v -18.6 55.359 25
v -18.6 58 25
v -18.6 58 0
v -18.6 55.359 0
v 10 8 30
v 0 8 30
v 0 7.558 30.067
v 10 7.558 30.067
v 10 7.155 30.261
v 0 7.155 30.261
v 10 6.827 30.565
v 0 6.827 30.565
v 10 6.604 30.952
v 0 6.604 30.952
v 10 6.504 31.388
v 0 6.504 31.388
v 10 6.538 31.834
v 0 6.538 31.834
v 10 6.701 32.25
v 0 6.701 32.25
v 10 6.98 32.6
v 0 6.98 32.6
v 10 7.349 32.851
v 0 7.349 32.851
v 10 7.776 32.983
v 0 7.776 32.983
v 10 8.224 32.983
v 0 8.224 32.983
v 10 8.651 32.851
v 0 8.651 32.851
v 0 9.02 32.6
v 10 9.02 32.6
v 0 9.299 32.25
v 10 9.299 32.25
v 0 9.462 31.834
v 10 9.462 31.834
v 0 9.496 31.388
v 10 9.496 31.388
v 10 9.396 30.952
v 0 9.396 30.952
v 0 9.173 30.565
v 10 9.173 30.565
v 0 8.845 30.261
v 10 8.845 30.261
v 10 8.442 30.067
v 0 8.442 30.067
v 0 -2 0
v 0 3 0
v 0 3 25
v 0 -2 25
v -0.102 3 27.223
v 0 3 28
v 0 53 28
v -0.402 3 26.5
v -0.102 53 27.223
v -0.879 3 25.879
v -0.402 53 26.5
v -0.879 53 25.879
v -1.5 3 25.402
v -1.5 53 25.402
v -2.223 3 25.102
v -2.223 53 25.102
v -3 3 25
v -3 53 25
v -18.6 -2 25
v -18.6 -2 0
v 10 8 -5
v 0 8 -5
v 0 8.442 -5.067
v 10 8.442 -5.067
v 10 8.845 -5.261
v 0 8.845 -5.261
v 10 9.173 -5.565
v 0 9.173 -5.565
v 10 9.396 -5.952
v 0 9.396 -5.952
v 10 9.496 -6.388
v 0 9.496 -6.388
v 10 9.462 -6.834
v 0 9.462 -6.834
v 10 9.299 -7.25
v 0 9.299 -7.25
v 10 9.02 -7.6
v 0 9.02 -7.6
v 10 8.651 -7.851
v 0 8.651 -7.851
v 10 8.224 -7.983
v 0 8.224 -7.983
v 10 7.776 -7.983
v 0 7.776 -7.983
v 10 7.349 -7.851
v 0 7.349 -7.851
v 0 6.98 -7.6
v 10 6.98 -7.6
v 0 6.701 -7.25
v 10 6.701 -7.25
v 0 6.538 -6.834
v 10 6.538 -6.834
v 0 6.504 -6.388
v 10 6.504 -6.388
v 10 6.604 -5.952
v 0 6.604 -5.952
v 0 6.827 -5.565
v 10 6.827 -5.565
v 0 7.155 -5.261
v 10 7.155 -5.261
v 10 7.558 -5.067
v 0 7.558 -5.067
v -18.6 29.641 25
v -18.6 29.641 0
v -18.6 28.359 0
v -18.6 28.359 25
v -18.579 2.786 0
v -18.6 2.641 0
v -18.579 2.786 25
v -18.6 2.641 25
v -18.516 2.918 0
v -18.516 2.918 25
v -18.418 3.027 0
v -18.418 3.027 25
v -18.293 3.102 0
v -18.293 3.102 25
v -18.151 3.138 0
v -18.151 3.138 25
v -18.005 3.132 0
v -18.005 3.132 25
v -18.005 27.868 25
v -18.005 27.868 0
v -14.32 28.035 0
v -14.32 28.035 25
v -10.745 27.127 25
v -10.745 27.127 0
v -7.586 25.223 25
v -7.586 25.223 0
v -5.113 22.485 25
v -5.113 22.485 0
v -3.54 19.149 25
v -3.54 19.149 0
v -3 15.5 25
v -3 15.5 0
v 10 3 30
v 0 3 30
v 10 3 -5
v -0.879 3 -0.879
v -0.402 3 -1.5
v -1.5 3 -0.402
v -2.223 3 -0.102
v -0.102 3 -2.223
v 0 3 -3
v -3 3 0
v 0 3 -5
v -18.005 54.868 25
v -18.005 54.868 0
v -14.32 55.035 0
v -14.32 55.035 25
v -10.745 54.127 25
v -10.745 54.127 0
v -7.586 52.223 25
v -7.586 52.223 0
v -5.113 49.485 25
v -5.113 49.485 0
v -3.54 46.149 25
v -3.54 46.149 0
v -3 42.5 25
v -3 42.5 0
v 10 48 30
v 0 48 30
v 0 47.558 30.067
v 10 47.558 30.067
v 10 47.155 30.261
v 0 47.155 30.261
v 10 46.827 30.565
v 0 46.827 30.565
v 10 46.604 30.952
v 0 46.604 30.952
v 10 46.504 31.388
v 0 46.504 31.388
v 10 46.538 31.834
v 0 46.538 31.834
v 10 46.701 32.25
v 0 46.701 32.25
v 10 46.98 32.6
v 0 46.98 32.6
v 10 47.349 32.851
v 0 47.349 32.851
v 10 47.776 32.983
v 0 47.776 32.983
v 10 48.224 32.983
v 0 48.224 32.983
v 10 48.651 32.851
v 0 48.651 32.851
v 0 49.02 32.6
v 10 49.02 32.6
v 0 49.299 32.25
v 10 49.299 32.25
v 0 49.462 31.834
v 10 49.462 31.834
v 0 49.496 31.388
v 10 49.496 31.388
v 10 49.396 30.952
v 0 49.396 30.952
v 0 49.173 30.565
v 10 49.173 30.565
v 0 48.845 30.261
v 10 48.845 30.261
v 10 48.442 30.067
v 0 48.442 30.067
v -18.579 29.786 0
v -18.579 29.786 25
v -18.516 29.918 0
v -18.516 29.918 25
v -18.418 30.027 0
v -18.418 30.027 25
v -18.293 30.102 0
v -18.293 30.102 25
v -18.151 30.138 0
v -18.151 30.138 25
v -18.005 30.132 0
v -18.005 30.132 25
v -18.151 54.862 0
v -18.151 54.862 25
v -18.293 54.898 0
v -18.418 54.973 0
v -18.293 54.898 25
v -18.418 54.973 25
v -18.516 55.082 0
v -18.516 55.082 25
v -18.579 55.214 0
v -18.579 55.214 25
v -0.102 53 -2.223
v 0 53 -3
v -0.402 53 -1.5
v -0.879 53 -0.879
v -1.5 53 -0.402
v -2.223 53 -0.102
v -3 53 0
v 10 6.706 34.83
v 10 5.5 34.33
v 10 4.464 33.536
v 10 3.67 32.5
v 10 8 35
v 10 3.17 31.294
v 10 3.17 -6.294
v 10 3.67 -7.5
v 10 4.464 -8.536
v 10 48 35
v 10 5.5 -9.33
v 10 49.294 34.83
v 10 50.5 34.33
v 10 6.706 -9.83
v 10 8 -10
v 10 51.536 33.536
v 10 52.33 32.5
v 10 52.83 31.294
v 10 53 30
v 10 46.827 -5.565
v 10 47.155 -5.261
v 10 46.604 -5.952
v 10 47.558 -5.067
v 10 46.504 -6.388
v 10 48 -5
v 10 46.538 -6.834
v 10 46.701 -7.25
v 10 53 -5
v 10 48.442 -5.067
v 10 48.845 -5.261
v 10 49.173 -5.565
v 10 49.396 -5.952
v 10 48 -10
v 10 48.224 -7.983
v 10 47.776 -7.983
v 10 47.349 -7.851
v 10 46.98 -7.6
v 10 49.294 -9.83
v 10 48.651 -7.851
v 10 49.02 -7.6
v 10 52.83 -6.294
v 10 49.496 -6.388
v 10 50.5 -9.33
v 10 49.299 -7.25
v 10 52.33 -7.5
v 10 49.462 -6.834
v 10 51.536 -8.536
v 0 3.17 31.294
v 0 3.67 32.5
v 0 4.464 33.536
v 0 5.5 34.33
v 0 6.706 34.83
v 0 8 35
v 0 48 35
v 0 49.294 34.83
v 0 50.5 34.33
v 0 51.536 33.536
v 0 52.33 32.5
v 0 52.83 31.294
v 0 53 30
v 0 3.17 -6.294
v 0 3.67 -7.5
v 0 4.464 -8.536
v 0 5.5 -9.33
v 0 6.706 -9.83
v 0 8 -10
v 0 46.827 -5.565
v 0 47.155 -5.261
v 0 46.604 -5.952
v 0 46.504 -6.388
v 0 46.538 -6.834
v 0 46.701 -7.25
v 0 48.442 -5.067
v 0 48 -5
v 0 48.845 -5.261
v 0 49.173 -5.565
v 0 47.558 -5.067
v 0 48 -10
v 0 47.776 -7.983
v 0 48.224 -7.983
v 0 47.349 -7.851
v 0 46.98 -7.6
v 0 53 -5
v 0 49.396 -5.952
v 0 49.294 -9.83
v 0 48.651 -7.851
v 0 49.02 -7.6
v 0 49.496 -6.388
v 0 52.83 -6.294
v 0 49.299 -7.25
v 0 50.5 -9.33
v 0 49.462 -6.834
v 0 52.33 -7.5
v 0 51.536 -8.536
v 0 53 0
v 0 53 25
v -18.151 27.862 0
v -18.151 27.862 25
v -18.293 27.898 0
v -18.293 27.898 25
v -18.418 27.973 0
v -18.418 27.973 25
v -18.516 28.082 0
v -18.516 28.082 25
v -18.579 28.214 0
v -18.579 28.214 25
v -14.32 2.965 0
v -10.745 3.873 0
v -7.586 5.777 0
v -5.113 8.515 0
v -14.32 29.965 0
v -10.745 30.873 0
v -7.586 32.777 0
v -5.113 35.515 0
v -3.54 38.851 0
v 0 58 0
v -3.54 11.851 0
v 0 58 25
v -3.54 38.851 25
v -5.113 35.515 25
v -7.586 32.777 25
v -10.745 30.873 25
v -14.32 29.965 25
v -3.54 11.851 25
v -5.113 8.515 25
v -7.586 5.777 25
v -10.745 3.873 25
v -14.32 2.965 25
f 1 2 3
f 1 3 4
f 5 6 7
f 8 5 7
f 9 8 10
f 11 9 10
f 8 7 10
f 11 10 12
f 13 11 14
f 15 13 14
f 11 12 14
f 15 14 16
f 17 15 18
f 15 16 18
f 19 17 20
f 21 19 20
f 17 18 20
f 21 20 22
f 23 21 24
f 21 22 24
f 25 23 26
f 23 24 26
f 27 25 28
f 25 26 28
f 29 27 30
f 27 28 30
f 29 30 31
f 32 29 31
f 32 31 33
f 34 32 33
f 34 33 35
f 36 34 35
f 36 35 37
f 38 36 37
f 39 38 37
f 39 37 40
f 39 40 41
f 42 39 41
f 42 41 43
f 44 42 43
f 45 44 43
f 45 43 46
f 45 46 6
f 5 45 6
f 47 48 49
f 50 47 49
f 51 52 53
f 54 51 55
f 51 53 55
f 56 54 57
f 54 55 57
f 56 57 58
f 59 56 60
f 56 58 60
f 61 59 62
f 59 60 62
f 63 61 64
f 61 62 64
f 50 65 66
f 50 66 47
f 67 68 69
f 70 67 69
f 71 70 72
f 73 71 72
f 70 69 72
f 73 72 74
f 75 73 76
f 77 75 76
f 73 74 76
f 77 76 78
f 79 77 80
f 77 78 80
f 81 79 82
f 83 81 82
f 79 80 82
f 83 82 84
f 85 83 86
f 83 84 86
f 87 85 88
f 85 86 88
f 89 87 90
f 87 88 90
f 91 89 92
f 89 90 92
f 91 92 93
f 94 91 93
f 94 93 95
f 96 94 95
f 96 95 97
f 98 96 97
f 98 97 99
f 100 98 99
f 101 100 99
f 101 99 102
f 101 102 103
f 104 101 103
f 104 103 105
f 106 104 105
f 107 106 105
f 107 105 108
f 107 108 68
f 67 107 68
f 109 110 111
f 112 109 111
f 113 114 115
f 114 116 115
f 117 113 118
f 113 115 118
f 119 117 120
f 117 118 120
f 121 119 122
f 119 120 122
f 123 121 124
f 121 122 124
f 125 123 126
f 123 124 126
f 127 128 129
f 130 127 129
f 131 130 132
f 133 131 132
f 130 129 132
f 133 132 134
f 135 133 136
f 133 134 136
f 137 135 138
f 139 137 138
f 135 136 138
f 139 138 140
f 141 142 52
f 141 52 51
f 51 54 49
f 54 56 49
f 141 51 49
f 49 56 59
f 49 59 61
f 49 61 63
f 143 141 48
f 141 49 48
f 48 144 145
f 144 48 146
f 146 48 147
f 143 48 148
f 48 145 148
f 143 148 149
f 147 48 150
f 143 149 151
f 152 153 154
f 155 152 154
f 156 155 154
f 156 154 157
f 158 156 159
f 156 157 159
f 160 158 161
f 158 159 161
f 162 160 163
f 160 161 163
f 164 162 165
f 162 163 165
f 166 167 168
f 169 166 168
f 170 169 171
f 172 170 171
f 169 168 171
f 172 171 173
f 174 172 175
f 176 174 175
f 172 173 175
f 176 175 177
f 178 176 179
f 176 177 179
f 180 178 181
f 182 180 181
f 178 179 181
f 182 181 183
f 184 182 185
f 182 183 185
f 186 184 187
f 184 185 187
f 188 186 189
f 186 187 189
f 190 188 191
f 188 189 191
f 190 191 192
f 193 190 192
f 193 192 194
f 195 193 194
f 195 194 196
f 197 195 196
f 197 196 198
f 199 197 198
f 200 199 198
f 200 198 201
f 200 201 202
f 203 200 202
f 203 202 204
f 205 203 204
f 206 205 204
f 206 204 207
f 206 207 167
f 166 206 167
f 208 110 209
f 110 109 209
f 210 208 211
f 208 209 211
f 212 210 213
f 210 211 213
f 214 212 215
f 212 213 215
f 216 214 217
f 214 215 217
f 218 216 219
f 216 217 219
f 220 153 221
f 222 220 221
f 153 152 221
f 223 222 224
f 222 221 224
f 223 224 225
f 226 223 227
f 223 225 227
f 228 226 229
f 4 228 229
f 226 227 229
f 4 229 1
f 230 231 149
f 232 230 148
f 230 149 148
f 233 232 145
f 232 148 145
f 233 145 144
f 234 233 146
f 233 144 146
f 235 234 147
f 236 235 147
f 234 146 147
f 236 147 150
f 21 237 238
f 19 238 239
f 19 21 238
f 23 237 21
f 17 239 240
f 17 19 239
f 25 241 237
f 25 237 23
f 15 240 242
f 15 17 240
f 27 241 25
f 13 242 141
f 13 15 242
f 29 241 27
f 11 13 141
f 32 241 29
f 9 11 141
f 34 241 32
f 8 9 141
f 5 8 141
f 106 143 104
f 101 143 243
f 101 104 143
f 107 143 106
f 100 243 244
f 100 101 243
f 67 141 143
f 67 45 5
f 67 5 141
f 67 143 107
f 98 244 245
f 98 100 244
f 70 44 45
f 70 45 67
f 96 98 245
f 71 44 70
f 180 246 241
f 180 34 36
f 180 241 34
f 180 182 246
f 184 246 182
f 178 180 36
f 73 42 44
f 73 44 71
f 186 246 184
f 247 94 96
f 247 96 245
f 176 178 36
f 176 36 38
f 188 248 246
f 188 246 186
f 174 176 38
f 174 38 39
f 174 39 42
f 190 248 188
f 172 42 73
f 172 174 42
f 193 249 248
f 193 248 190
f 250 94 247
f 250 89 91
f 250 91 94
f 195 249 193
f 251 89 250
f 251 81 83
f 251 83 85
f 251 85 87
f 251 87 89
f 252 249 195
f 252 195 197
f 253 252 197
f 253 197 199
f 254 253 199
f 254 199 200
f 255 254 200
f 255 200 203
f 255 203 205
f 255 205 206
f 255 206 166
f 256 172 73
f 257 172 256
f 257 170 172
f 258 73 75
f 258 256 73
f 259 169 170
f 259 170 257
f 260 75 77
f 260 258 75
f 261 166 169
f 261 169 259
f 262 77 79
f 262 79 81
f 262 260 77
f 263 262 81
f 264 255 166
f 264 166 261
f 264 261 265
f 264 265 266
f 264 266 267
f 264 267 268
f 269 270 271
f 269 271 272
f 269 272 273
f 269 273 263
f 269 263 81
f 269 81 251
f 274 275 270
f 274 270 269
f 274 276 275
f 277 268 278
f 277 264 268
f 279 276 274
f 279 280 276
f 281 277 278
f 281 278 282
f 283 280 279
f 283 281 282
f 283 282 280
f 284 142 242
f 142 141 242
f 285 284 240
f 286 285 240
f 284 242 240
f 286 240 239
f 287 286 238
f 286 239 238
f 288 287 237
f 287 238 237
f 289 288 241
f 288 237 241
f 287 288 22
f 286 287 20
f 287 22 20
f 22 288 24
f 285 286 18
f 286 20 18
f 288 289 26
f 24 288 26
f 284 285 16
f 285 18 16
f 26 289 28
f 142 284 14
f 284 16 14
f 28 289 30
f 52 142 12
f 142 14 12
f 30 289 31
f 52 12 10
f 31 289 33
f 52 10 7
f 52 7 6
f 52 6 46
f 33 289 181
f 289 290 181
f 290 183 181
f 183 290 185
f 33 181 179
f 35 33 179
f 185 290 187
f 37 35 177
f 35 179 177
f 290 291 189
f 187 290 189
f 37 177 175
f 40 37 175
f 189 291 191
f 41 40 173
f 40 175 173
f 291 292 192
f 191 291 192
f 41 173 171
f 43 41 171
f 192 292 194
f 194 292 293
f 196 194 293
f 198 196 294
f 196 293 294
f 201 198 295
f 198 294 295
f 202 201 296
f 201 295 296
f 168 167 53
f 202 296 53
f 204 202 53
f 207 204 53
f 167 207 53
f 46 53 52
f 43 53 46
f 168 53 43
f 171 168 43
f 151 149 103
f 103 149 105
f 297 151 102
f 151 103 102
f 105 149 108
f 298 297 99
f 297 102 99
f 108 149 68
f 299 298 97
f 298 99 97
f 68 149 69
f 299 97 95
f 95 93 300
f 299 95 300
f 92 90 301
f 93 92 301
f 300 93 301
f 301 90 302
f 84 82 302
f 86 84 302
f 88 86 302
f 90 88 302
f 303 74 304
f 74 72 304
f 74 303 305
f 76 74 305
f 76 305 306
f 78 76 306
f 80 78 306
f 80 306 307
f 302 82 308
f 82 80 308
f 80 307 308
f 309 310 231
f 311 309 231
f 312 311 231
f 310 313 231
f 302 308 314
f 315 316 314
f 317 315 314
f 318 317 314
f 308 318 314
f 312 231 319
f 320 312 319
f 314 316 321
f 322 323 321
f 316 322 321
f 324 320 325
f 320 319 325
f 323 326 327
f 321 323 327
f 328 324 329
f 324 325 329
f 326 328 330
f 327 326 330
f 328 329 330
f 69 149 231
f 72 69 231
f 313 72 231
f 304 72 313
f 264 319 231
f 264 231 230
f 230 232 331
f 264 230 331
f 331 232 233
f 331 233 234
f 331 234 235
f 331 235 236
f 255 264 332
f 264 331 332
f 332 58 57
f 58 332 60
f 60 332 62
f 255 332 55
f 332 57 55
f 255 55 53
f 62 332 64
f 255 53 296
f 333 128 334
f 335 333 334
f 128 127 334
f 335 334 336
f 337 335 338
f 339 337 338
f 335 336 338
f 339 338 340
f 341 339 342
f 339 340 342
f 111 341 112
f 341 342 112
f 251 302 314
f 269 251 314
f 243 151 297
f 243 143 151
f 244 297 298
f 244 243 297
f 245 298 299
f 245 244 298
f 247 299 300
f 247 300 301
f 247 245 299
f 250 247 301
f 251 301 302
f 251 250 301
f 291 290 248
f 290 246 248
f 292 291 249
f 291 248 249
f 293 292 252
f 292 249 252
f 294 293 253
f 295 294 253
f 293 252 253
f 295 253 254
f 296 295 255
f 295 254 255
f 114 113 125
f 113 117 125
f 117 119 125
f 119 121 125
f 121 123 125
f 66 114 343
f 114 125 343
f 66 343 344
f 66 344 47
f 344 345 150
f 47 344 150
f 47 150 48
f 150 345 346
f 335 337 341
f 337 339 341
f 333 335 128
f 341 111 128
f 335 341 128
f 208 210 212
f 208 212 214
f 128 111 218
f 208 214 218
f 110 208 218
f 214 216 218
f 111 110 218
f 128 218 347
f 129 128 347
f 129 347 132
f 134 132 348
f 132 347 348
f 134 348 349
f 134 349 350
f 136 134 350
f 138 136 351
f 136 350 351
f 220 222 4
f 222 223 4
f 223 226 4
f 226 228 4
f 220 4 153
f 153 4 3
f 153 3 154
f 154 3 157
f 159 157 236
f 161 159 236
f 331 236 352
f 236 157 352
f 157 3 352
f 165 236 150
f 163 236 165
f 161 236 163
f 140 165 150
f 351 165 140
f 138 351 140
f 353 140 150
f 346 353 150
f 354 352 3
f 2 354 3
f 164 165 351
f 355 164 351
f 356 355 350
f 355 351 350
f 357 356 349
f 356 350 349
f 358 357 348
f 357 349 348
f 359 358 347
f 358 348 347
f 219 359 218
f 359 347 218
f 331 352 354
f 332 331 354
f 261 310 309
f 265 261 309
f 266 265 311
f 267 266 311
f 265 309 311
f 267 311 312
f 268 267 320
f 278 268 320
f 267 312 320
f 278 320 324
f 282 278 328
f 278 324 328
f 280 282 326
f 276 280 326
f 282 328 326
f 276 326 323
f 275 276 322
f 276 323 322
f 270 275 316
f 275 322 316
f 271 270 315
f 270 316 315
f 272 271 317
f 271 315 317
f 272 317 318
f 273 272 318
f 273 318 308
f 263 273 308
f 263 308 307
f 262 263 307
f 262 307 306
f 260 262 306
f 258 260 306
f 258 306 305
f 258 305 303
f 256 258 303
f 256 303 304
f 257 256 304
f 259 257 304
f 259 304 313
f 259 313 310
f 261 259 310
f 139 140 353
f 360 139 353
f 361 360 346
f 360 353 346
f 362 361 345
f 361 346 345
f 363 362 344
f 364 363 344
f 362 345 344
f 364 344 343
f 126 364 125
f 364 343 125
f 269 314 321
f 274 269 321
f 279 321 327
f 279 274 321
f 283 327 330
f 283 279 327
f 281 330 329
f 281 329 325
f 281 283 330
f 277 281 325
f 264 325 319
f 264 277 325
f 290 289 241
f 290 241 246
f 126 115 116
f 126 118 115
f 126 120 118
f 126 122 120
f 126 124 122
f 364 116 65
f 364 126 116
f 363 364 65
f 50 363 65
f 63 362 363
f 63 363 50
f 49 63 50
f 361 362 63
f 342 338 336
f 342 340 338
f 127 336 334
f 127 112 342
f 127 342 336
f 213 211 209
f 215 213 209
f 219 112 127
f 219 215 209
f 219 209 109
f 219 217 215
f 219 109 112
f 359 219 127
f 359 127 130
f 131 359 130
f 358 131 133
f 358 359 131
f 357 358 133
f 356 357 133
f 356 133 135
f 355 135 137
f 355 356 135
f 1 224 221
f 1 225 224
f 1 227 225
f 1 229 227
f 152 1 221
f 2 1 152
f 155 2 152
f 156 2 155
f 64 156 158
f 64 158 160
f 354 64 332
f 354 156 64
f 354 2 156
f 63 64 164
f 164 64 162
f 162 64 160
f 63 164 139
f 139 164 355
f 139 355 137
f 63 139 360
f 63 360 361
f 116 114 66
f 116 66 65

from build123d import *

# Parameters (mm, degrees)
BOSS_EXTRUDE1_DEPTH = 25
SKETCH2_W           = 18.6
SKETCH2_H           = 25
BOSS_EXTRUDE2_DEPTH = 2
FILLET1_R           = 0.5
SKETCH3_W           = 12.5
SKETCH3_H           = 50
SKETCH3_W_2         = 10
BOSS_EXTRUDE3_DEPTH = 10
FILLET2_R           = 3
SKETCH4_R           = 1.5
CUT_EXTRUDE1_DEPTH  = 71.249270459
FILLET3_R           = 5


with BuildPart() as part:
    # Sketch1 → Boss-Extrude1 (new body)
    with BuildSketch(Plane.XY):
        with BuildLine():
            Line((-18.6, 0), (0, 0))
            Line((0, 0), (0, 58))
            Line((0, 58), (-18.6, 58))
            Line((-18.6, 58), (-18.6, 54.737646833))
            ThreePointArc((-18.6, 54.737646833), (-7.823111162, 52.413626985), (-3, 42.5))
            ThreePointArc((-3, 42.5), (-7.823111162, 32.586373015), (-18.6, 30.262353167))
            Line((-18.6, 30.262353167), (-18.6, 27.737646833))
            ThreePointArc((-18.6, 27.737646833), (-7.823111162, 25.413626985), (-3, 15.5))
            ThreePointArc((-3, 15.5), (-7.823111162, 5.586373015), (-18.6, 3.262353167))
            Line((-18.6, 3.262353167), (-18.6, 0))
        make_face()
    extrude(amount=BOSS_EXTRUDE1_DEPTH)

    # Sketch2 → Boss-Extrude2 (add)
    with BuildSketch(Plane.XZ):
        with Locations((-9.3, 12.5)):
            Rectangle(SKETCH2_W, SKETCH2_H)
    extrude(amount=BOSS_EXTRUDE2_DEPTH)

    # Fillet1
    fillet1_edges = [part.edges().sort_by_distance(p)[0] for p in [
        (-18.6, 3.262353167, 12.5),
        (-18.6, 27.737646833, 12.5),
        (-18.6, 30.262353167, 12.5),
        (-18.6, 54.737646833, 12.5),
    ]]
    fillet(fillet1_edges, radius=FILLET1_R)

    # Sketch3 → Boss-Extrude3 (add)
    with BuildSketch(Plane(origin=(0, 0, 0), x_dir=(0, 0, -1), z_dir=(1, 0, 0))):
        with Locations((-18.75, 28)):
            Rectangle(SKETCH3_W, SKETCH3_H)
        with Locations((-6.25, 28)):
            Rectangle(SKETCH3_W, SKETCH3_H)
        with Locations((5, 28)):
            Rectangle(SKETCH3_W_2, SKETCH3_H)
        with Locations((-30, 28)):
            Rectangle(SKETCH3_W_2, SKETCH3_H)
    extrude(amount=BOSS_EXTRUDE3_DEPTH)

    # Fillet2
    fillet2_edges = [part.edges().sort_by_distance(p)[0] for p in [
        (0, 28, 0),
        (0, 28, 25),
    ]]
    fillet(fillet2_edges, radius=FILLET2_R - 0.0001)  # a hair under: the kernel refuses the full size

    # Sketch4 → Cut-Extrude1 (cut, through all)
    with BuildSketch(Plane.ZY):
        with Locations((-6.5, 48)):
            Circle(SKETCH4_R)
        with Locations((-6.5, 8)):
            Circle(SKETCH4_R)
        with Locations(Location((31.5, 8, 0), (0, 0, 180))):
            Circle(SKETCH4_R)
        with Locations(Location((31.5, 48, 0), (0, 0, 180))):
            Circle(SKETCH4_R)
    extrude(amount=-CUT_EXTRUDE1_DEPTH, mode=Mode.SUBTRACT)

    # Fillet3
    fillet3_edges = [part.edges().sort_by_distance(p)[0] for p in [
        (5, 3, 35),
        (5, 3, -10),
        (5, 53, -10),
        (5, 53, 35),
    ]]
    fillet(fillet3_edges, radius=FILLET3_R)


solid = part.part
